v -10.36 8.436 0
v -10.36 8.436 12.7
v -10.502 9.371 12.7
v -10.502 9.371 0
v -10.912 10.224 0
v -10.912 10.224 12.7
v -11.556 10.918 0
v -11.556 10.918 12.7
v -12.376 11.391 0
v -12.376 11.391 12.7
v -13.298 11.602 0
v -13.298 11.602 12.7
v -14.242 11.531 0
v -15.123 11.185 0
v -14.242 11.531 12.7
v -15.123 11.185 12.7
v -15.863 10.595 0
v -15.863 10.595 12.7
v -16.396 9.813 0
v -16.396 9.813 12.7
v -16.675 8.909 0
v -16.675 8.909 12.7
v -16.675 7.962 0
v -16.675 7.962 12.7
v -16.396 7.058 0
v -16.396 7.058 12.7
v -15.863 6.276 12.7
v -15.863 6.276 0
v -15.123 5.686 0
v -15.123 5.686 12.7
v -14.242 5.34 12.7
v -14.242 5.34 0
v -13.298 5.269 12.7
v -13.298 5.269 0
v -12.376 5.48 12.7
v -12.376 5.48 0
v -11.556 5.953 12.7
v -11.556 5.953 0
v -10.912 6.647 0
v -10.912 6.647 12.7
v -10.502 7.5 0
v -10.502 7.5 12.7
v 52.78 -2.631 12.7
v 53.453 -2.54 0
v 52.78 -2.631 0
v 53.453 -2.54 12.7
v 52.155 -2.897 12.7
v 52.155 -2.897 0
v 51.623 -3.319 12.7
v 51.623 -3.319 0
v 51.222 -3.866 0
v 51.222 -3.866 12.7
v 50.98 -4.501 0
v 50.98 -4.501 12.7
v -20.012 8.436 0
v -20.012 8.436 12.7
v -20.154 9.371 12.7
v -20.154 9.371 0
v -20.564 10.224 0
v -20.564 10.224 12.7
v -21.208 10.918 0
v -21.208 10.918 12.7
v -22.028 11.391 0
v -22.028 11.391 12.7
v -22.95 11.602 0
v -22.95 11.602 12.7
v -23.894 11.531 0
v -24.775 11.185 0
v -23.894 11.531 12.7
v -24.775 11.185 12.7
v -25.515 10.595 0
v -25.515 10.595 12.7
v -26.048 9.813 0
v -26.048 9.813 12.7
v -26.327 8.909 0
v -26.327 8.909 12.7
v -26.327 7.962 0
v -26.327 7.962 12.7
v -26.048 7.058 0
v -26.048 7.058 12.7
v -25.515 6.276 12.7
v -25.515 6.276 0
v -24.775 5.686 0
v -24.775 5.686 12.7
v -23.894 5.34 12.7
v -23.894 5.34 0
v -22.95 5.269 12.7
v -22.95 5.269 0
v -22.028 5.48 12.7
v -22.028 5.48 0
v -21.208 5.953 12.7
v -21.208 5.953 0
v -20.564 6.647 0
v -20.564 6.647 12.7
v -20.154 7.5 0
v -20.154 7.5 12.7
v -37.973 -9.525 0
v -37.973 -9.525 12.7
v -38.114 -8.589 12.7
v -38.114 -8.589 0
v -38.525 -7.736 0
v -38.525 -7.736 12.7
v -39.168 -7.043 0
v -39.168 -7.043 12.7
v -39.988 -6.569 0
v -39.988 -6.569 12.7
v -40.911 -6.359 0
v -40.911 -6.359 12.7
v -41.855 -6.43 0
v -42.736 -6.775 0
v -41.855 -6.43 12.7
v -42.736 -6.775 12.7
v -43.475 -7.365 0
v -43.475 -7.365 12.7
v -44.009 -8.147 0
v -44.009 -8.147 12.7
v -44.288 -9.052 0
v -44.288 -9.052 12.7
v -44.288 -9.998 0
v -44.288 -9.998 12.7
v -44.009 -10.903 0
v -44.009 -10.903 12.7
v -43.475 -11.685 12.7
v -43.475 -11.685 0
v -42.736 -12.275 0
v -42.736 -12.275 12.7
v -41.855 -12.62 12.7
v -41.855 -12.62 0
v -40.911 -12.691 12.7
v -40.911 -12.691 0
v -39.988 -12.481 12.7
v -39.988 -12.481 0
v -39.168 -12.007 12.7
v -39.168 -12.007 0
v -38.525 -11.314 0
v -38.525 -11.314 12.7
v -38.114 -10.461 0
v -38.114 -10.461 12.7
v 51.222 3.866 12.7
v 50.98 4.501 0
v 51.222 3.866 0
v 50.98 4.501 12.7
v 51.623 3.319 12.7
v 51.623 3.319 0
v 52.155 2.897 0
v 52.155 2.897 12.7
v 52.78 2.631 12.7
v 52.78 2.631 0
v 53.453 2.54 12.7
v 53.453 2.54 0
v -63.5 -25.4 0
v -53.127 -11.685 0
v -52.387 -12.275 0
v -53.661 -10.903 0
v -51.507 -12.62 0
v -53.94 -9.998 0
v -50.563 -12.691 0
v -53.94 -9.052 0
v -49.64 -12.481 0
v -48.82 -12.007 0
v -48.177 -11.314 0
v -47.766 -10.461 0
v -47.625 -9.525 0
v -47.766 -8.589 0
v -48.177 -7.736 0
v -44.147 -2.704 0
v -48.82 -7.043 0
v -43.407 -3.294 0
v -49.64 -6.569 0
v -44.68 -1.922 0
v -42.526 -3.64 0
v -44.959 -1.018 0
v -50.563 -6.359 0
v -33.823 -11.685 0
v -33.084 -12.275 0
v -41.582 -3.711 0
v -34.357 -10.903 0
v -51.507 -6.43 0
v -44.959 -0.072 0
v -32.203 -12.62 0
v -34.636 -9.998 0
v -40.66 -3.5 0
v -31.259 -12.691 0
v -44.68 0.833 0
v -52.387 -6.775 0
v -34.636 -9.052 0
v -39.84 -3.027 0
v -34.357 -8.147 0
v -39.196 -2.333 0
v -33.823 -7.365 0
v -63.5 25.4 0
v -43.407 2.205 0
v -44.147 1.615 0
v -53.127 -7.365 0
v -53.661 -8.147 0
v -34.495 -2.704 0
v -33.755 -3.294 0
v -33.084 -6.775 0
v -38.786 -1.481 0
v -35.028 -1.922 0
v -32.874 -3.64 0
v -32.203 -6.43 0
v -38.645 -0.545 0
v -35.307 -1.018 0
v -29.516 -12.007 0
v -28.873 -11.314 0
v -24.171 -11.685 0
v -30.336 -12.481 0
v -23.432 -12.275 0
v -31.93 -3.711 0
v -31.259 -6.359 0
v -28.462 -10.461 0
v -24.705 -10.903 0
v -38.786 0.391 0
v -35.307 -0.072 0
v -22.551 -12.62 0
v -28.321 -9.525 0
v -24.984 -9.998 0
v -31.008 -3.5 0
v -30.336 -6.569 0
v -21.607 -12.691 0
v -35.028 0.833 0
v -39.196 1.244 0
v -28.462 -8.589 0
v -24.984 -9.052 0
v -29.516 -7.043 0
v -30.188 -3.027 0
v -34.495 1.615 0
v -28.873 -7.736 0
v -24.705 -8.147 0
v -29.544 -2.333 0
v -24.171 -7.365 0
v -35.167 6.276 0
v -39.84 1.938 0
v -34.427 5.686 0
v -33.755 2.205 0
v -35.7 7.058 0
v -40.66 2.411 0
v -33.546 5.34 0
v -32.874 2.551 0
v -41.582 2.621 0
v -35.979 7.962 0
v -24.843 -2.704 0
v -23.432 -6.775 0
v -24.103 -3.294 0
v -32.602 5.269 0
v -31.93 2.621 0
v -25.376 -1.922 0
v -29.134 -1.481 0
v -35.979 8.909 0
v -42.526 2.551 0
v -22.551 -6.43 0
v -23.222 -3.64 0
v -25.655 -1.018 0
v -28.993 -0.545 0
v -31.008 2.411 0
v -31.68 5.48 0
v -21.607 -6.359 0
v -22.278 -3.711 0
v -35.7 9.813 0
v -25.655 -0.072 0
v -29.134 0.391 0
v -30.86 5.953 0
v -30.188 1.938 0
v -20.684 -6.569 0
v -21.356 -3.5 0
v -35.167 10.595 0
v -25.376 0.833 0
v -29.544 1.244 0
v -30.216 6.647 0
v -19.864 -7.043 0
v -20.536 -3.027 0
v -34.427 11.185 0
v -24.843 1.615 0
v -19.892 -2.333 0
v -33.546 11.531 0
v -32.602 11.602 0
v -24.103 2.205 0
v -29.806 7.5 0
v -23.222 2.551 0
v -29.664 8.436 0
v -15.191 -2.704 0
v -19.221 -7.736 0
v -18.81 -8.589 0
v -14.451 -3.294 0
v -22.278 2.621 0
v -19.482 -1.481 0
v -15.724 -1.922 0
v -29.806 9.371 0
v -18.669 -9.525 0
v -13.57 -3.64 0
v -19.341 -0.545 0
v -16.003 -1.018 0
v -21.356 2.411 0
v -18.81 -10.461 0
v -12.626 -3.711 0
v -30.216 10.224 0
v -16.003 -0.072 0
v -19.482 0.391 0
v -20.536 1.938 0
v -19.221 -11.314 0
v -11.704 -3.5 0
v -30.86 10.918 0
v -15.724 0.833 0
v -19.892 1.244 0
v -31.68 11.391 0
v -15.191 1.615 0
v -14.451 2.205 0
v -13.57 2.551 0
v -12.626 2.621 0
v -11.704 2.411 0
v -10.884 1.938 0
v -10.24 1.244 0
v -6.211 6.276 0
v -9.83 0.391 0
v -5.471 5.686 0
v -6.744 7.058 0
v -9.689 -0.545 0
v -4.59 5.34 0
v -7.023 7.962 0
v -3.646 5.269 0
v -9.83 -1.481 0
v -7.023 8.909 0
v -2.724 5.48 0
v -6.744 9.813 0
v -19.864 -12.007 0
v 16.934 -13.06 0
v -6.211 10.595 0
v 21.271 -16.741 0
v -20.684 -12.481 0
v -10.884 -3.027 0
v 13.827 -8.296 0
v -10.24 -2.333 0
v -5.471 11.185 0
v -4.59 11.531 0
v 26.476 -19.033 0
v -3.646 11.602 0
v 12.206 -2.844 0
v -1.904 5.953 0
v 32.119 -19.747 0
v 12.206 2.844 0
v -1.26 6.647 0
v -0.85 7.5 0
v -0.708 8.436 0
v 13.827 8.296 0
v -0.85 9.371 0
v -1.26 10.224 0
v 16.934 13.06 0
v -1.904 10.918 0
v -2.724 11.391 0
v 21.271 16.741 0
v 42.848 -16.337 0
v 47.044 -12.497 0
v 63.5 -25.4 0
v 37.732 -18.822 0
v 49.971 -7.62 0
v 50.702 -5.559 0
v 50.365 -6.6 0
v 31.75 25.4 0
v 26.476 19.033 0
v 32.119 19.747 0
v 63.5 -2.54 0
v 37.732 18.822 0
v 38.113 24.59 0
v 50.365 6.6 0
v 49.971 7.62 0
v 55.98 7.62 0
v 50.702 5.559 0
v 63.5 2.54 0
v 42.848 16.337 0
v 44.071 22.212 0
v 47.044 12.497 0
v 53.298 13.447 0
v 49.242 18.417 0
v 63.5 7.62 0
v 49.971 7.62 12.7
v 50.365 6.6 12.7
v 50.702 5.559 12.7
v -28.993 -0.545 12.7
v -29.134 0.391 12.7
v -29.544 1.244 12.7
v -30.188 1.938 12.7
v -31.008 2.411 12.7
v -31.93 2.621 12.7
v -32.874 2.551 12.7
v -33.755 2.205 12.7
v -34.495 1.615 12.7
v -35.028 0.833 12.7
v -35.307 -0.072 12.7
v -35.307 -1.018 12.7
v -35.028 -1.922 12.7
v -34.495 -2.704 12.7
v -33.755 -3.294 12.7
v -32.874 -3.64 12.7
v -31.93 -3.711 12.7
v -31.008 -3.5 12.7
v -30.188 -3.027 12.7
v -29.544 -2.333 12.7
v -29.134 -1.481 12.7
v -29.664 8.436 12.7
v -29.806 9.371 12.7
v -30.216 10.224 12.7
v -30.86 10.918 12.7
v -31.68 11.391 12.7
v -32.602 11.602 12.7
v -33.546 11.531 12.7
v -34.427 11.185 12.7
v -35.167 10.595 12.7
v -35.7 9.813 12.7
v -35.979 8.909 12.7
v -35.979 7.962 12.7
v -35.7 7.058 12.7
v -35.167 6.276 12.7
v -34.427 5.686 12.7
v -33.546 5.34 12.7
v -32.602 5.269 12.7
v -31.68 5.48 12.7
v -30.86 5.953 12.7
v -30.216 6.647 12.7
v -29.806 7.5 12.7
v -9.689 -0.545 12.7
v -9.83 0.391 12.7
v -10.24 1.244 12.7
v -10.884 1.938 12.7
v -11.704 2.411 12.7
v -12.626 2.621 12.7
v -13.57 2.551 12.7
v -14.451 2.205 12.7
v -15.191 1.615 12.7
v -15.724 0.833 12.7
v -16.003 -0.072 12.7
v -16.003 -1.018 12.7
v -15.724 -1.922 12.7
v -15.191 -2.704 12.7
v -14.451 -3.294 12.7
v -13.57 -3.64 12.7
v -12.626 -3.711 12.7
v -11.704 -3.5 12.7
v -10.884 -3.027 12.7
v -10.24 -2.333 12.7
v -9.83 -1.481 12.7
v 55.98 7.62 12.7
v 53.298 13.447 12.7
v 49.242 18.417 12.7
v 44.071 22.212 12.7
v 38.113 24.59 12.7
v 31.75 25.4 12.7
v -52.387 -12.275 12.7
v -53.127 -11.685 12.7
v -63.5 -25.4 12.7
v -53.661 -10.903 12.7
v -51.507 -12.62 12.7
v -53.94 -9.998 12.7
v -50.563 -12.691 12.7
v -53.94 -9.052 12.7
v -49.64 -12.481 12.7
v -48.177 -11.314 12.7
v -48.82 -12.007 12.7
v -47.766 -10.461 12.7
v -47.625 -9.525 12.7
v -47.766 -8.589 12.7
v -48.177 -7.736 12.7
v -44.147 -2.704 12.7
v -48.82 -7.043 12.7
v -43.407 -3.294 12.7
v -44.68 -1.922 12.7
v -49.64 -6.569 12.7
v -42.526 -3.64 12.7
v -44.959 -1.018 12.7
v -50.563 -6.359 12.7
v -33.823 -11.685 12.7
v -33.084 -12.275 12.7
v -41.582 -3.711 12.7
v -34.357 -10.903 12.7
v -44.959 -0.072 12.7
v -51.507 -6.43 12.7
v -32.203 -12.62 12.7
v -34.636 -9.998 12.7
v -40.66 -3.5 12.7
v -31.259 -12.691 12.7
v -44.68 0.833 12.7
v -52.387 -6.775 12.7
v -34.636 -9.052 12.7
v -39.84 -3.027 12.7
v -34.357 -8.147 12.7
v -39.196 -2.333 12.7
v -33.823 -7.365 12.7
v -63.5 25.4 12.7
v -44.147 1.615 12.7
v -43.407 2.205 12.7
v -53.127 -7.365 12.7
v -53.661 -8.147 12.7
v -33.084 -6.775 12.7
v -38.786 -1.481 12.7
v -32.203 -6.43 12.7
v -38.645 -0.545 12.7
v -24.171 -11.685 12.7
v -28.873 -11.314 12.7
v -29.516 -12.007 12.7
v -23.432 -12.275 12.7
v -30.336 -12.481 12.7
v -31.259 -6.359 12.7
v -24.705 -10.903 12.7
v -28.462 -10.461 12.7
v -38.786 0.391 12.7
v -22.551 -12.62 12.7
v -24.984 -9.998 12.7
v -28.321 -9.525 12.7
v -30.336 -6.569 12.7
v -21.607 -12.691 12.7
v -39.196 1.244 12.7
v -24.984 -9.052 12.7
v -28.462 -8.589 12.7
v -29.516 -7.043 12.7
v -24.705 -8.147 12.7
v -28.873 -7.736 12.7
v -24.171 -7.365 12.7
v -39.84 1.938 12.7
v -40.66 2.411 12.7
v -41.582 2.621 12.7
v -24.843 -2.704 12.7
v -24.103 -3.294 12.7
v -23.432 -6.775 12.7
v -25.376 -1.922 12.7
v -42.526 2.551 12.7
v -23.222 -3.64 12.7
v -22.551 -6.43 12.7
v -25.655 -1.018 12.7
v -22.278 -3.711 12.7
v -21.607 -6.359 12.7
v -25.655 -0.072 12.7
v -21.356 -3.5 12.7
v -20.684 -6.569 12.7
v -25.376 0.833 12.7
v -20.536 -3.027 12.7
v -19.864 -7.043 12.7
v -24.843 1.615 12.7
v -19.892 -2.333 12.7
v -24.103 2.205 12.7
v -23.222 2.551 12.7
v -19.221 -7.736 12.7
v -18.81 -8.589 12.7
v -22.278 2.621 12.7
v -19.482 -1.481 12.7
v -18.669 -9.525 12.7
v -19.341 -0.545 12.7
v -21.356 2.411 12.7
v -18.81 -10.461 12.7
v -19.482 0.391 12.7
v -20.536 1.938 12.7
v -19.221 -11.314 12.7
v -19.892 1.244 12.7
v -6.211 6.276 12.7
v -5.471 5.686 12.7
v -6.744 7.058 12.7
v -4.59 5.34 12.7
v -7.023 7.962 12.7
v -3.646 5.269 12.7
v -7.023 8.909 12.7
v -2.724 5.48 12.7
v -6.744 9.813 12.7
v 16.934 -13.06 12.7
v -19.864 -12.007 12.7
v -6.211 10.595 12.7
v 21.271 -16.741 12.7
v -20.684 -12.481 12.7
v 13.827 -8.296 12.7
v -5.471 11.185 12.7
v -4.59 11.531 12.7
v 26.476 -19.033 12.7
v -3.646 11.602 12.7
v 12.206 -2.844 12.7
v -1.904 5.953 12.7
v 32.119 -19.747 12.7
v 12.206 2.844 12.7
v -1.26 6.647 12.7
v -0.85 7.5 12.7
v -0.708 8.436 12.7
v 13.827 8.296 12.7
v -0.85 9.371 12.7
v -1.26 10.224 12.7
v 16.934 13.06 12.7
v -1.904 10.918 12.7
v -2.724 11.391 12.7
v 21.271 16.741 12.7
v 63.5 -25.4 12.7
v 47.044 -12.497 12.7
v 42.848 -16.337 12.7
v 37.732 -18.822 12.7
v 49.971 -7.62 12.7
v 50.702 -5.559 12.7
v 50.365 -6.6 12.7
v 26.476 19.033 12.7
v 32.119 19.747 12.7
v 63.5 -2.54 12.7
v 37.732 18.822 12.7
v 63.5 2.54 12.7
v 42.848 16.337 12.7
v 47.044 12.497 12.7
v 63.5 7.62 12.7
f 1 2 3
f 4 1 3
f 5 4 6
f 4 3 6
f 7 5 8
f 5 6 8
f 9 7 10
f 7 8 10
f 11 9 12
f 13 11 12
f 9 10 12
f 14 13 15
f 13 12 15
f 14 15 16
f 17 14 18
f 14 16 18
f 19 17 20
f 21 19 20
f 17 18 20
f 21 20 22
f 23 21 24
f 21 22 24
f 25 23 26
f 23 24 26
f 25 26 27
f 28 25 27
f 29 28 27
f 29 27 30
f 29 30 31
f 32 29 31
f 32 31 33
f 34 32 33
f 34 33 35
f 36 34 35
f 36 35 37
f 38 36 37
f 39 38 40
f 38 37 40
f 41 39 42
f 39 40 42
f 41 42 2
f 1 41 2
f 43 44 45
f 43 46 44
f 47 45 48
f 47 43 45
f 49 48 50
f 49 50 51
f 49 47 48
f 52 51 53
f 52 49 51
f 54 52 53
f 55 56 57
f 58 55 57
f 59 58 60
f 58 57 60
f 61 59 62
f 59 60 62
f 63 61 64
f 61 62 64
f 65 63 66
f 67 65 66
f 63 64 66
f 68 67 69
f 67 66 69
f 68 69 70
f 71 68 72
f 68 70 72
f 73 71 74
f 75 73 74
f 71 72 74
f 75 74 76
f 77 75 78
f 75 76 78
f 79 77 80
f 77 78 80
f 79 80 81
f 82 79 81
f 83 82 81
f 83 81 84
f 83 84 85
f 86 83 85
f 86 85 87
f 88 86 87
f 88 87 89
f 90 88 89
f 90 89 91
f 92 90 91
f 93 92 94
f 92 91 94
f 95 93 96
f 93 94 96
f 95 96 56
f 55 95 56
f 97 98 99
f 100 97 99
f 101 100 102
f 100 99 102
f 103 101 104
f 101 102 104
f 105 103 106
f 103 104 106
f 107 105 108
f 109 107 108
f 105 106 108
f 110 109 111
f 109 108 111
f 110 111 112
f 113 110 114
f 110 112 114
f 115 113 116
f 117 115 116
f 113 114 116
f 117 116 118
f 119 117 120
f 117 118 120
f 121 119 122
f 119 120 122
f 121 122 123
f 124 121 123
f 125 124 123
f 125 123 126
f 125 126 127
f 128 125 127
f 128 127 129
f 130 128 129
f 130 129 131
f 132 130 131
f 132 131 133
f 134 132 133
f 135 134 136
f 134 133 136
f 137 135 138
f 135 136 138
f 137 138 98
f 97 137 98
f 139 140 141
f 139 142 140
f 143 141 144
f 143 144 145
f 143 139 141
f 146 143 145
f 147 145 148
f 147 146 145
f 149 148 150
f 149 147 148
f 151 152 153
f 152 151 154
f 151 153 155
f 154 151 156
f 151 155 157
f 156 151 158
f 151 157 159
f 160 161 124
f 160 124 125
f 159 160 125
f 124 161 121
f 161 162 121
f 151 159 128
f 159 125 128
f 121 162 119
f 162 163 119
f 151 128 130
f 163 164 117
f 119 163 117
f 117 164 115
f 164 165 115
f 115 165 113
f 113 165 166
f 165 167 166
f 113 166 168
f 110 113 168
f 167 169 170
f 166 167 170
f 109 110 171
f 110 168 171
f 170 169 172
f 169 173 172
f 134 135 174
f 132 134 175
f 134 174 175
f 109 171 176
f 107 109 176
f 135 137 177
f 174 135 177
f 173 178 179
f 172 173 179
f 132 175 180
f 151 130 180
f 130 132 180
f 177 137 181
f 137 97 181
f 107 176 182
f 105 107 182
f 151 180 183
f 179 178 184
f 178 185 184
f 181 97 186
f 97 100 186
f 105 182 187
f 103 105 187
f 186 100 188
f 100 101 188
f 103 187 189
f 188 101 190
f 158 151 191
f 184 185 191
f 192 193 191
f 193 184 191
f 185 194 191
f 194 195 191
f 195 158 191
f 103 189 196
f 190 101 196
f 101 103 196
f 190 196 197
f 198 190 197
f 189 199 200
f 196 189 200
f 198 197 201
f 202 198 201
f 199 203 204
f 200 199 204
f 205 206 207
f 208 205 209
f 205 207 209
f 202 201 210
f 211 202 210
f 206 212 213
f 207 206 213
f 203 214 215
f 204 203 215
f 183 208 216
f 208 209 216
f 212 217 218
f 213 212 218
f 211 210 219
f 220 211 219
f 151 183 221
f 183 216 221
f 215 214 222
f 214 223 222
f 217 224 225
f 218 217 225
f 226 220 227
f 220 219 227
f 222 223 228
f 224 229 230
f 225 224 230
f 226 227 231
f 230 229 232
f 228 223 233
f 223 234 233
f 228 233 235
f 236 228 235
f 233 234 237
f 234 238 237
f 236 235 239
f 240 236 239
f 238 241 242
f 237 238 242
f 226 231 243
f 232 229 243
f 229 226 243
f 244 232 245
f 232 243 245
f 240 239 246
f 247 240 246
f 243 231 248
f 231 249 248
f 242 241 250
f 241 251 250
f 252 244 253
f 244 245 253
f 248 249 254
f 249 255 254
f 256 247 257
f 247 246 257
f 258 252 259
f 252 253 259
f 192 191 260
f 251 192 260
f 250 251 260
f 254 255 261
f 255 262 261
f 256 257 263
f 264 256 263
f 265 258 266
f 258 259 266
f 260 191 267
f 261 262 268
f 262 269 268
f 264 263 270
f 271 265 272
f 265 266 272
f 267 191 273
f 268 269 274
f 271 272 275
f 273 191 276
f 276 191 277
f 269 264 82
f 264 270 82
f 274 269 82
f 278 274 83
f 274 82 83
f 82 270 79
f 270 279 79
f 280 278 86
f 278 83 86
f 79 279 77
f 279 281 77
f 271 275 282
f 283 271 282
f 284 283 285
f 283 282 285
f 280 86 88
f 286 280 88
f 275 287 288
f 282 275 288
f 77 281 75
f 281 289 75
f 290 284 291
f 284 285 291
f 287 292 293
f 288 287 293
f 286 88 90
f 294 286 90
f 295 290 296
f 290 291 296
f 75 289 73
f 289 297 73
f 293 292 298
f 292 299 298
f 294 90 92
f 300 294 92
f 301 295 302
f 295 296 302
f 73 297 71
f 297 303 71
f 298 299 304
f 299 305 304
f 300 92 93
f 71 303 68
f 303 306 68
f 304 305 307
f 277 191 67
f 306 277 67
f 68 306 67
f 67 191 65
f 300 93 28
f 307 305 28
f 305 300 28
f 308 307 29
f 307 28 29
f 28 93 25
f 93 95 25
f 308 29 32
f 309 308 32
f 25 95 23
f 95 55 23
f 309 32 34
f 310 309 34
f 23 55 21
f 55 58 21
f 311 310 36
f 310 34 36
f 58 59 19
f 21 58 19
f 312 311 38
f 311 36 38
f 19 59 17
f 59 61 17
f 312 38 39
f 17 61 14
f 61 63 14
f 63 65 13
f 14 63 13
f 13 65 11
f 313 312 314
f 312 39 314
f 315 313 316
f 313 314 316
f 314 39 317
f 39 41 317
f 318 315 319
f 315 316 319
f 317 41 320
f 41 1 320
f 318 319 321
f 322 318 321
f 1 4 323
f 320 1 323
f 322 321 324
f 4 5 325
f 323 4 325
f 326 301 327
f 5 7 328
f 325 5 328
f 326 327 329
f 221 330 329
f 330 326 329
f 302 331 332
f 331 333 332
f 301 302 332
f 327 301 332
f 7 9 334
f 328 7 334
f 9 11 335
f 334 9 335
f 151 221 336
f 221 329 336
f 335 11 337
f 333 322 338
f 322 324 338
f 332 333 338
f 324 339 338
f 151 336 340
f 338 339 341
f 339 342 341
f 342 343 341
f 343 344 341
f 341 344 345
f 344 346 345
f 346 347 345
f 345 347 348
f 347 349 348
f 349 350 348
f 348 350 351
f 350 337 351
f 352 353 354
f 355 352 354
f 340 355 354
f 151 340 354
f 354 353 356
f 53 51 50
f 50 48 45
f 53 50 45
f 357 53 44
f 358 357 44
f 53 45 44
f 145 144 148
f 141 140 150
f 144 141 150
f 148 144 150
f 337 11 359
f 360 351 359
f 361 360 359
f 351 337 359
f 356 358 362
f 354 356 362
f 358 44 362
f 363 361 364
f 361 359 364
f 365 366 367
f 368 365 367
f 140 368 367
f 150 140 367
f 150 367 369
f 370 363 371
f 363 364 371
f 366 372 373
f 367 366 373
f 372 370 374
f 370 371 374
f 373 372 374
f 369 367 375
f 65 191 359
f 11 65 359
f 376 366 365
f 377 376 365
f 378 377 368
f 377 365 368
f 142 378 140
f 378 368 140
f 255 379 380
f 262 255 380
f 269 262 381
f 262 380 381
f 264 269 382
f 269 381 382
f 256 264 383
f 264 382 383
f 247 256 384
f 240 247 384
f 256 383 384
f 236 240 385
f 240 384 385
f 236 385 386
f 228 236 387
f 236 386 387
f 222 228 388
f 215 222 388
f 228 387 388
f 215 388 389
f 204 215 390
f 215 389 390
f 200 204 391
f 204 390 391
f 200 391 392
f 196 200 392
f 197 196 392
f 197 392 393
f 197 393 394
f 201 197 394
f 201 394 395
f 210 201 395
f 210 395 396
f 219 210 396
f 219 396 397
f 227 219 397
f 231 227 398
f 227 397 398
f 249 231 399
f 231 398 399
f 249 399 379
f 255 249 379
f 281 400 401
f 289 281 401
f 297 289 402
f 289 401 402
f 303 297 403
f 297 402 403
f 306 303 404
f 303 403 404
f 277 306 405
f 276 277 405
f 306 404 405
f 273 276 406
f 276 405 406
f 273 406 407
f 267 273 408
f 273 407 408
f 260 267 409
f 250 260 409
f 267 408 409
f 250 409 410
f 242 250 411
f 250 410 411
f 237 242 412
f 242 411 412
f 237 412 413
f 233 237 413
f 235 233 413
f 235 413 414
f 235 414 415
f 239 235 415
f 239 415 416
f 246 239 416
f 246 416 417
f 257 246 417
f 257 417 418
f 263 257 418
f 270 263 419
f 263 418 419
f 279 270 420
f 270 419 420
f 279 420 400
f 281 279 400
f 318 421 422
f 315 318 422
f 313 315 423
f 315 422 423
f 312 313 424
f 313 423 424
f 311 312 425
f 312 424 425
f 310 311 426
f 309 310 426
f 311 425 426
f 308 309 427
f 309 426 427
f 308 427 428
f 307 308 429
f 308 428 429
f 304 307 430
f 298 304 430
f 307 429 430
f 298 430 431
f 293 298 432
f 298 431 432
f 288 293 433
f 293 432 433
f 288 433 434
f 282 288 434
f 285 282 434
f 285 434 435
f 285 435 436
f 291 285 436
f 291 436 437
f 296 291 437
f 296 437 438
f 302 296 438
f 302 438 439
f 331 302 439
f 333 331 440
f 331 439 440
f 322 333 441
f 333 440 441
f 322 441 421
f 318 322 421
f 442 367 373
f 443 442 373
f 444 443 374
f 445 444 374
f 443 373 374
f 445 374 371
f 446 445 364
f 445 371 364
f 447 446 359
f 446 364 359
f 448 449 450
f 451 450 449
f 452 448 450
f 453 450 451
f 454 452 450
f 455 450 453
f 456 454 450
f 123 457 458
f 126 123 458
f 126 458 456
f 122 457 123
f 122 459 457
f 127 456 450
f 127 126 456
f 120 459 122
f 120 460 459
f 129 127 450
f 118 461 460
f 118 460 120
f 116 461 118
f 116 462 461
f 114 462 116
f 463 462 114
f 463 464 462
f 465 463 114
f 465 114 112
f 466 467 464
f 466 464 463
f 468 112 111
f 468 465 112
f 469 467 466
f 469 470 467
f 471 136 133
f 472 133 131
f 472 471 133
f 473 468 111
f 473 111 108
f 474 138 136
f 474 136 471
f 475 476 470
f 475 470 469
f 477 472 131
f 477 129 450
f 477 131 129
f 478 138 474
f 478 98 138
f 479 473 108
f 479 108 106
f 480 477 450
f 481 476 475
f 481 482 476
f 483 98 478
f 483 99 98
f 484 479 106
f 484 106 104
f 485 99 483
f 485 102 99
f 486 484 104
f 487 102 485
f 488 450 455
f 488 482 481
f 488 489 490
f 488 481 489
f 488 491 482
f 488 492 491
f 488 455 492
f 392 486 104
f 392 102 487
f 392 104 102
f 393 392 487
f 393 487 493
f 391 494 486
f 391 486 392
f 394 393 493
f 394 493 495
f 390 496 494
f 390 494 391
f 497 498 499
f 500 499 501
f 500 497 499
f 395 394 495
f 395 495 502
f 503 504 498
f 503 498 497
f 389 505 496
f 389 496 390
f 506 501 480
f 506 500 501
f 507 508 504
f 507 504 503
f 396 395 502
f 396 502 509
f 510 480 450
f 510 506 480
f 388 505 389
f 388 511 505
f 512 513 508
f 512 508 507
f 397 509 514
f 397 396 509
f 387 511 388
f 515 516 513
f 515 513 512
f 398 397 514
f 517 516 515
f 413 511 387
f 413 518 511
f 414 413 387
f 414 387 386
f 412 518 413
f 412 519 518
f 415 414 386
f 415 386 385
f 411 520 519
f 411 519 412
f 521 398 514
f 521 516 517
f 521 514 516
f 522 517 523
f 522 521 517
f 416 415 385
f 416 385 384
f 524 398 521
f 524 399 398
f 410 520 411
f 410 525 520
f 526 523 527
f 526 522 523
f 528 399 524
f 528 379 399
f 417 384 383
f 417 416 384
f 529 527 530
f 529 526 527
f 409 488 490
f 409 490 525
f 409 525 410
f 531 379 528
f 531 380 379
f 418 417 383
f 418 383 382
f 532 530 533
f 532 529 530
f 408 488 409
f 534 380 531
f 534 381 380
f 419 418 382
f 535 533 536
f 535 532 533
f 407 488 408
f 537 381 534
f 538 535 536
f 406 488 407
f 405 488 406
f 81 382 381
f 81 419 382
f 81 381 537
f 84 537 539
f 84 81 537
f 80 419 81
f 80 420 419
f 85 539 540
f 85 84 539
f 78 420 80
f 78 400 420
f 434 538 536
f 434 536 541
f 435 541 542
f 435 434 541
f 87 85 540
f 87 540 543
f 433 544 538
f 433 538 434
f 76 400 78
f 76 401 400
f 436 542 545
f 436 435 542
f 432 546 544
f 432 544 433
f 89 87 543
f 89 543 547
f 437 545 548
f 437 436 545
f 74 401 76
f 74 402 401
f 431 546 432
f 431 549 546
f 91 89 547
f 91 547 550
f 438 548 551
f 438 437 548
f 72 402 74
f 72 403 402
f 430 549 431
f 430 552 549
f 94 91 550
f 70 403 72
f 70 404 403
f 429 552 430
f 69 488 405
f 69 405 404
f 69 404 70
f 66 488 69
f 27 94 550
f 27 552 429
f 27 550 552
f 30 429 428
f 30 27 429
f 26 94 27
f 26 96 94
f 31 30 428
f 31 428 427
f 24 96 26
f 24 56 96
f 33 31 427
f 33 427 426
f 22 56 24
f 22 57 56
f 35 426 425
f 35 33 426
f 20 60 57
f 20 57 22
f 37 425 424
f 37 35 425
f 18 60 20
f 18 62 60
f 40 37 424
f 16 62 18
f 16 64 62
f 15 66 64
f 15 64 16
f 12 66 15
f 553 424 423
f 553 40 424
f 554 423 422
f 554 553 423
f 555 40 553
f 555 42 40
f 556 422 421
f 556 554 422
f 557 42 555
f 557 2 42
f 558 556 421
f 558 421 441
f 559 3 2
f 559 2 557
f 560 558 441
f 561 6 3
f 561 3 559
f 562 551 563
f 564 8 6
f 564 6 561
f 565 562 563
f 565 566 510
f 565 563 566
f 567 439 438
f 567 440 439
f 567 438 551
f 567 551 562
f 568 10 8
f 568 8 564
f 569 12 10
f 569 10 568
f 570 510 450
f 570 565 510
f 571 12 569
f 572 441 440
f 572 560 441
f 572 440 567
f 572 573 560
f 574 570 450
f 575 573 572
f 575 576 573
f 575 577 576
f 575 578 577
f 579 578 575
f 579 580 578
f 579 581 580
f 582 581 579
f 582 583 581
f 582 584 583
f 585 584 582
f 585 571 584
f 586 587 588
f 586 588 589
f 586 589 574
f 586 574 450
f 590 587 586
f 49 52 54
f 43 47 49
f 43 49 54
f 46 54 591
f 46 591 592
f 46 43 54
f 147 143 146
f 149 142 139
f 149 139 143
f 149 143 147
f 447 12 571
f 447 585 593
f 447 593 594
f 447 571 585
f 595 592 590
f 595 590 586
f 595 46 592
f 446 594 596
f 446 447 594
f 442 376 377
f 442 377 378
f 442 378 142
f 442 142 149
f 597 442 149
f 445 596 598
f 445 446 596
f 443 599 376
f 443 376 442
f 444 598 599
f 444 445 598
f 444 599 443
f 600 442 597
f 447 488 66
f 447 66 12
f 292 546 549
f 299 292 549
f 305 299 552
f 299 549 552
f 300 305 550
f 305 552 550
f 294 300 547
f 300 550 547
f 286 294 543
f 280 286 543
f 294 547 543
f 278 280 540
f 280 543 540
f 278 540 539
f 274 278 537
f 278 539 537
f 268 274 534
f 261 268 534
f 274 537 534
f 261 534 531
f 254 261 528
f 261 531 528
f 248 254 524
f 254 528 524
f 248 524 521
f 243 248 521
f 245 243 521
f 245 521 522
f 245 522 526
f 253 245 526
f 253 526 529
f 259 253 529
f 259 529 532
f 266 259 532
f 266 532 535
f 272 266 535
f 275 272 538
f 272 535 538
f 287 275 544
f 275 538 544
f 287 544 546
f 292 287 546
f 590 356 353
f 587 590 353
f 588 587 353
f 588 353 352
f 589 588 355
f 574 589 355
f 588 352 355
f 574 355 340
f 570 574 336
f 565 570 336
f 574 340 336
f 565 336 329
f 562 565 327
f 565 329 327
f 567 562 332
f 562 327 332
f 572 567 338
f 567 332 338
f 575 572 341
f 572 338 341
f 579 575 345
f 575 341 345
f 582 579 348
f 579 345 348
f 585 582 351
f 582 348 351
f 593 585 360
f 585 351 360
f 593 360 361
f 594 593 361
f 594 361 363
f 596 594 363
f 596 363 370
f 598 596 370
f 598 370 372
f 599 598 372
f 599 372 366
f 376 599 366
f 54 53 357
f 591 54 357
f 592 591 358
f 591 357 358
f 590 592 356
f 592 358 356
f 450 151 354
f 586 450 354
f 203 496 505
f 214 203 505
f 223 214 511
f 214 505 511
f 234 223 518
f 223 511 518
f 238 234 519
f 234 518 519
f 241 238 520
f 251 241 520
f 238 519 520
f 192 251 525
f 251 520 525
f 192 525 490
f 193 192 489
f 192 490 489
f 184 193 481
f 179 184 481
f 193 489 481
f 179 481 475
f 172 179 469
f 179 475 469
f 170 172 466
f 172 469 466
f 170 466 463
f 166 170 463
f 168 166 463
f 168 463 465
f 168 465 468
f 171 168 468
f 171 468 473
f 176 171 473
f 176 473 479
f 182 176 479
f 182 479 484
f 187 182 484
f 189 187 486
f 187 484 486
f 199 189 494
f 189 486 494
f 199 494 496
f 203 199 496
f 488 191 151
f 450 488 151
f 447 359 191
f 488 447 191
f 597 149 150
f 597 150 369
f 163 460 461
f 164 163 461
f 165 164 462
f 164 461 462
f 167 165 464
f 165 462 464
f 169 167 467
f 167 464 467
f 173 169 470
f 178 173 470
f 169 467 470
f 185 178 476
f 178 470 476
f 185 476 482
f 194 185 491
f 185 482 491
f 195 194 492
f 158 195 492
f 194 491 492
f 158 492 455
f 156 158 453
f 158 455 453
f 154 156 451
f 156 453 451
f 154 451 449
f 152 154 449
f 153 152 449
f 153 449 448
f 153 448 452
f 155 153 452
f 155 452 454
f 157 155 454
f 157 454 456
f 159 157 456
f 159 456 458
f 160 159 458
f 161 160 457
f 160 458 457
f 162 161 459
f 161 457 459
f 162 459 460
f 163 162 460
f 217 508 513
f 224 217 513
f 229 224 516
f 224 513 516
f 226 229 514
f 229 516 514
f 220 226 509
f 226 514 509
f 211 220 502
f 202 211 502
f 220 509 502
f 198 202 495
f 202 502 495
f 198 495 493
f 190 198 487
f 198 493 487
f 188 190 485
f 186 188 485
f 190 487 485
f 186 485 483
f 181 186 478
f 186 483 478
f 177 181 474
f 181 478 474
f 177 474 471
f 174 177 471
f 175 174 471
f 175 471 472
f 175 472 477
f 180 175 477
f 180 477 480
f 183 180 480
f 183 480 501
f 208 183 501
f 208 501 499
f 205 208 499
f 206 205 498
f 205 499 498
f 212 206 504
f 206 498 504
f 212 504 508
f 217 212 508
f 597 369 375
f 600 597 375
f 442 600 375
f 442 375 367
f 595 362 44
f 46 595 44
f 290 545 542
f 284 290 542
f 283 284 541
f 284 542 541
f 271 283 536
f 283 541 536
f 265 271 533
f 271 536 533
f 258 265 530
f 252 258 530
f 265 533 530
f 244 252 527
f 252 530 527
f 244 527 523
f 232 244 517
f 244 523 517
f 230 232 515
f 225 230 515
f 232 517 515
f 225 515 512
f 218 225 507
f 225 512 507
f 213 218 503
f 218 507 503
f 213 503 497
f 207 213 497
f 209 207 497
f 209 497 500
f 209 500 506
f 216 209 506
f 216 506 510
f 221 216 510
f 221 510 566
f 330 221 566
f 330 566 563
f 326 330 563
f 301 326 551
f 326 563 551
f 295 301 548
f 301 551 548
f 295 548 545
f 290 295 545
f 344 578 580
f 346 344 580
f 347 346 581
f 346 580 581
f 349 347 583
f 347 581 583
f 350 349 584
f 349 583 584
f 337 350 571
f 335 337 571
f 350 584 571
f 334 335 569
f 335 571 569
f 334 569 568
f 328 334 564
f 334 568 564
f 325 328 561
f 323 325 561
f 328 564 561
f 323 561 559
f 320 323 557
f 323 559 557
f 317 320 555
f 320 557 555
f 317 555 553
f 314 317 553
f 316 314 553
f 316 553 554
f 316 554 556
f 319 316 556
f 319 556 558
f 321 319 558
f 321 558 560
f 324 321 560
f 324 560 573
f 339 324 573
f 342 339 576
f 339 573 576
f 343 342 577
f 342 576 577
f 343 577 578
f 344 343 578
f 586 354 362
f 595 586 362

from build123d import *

# Parameters (mm, degrees)
BOSS_EXTRUDE1_DEPTH = 12.7
FILLET2_R           = 2.54
SKETCH2_R           = 3.175
CUT_EXTRUDE1_DEPTH  = 12.7


with BuildPart() as part:
    # Sketch1 → Boss-Extrude1 (new body)
    with BuildSketch(Plane.XY):
        with BuildLine():
            ThreePointArc((31.750000111, -25.4), (6.35, -1.11e-07), (31.749999889, 25.4))
            Line((31.749999889, 25.4), (-63.5, 25.4))
            Line((-63.5, 25.4), (-63.5, -25.4))
            Line((-63.5, -25.4), (31.750000111, -25.4))
        make_face()
        with BuildLine():
            ThreePointArc((49.97081502, -7.62), (12, 0), (49.97081502, 7.62))
            Line((49.97081502, 7.62), (55.980055716, 7.62))
            ThreePointArc((55.980055716, 7.62), (46.776842604, 20.478134714), (31.749999889, 25.4))
            ThreePointArc((31.749999889, 25.4), (6.35, -1.11e-07), (31.750000111, -25.4))
            ThreePointArc((31.750000111, -25.4), (46.776842694, -20.478134648), (55.980055716, -7.62))
            Line((55.980055716, -7.62), (49.97081502, -7.62))
        make_face()
        with BuildLine():
            ThreePointArc((49.97081502, 7.62), (50.823284356, 5.125653506), (51.335987338, 2.54))
            Line((51.335987338, 2.54), (57.022680903, 2.54))
            ThreePointArc((57.022680903, 2.54), (56.631355132, 5.106678649), (55.980055716, 7.62))
            Line((55.980055716, 7.62), (49.97081502, 7.62))
        make_face()
        with BuildLine():
            ThreePointArc((55.980055716, 7.62), (56.631355132, 5.106678649), (57.022680903, 2.54))
            Line((57.022680903, 2.54), (63.5, 2.54))
            Line((63.5, 2.54), (63.5, 7.62))
            Line((63.5, 7.62), (55.980055716, 7.62))
        make_face()
        with BuildLine():
            Line((57.022680903, -2.54), (51.335987338, -2.54))
            ThreePointArc((51.335987338, -2.54), (50.823284356, -5.125653506), (49.97081502, -7.62))
            Line((49.97081502, -7.62), (55.980055716, -7.62))
            ThreePointArc((55.980055716, -7.62), (56.631355132, -5.106678649), (57.022680903, -2.54))
        make_face()
        with BuildLine():
            Line((63.5, -2.54), (57.022680903, -2.54))
            ThreePointArc((57.022680903, -2.54), (56.631355132, -5.106678649), (55.980055716, -7.62))
            Line((55.980055716, -7.62), (63.5, -7.62))
            Line((63.5, -7.62), (63.5, -2.54))
        make_face()
        with BuildLine():
            Line((63.5, -7.62), (55.980055716, -7.62))
            ThreePointArc((55.980055716, -7.62), (46.776842694, -20.478134648), (31.750000111, -25.4))
            Line((31.750000111, -25.4), (63.5, -25.4))
            Line((63.5, -25.4), (63.5, -7.62))
        make_face()
    extrude(amount=BOSS_EXTRUDE1_DEPTH)

    # Fillet2
    fillet2_edges = [part.edges().sort_by_distance(p)[0] for p in [
        (51.335987338, 2.54, 6.35),
        (51.335987338, -2.54, 6.35),
    ]]
    fillet(fillet2_edges, radius=FILLET2_R)

    # Sketch2 → Cut-Extrude1 (cut)
    with BuildSketch(Plane.XY.offset(12.7)):
        with Locations((-50.8, -9.525)):
            Circle(SKETCH2_R)
        with Locations((-41.819743879, -0.544743879)):
            Circle(SKETCH2_R)
        with Locations((-32.839487758, 8.435512242)):
            Circle(SKETCH2_R)
        with Locations((-41.148, -9.525)):
            Circle(SKETCH2_R)
        with Locations((-32.167743879, -0.544743879)):
            Circle(SKETCH2_R)
        with Locations((-23.187487758, 8.435512242)):
            Circle(SKETCH2_R)
        with Locations((-31.496, -9.525)):
            Circle(SKETCH2_R)
        with Locations((-22.515743879, -0.544743879)):
            Circle(SKETCH2_R)
        with Locations((-13.535487758, 8.435512242)):
            Circle(SKETCH2_R)
        with Locations((-21.844, -9.525)):
            Circle(SKETCH2_R)
        with Locations((-12.863743879, -0.544743879)):
            Circle(SKETCH2_R)
        with Locations((-3.883487758, 8.435512242)):
            Circle(SKETCH2_R)
    extrude(amount=-CUT_EXTRUDE1_DEPTH, mode=Mode.SUBTRACT)


solid = part.part
